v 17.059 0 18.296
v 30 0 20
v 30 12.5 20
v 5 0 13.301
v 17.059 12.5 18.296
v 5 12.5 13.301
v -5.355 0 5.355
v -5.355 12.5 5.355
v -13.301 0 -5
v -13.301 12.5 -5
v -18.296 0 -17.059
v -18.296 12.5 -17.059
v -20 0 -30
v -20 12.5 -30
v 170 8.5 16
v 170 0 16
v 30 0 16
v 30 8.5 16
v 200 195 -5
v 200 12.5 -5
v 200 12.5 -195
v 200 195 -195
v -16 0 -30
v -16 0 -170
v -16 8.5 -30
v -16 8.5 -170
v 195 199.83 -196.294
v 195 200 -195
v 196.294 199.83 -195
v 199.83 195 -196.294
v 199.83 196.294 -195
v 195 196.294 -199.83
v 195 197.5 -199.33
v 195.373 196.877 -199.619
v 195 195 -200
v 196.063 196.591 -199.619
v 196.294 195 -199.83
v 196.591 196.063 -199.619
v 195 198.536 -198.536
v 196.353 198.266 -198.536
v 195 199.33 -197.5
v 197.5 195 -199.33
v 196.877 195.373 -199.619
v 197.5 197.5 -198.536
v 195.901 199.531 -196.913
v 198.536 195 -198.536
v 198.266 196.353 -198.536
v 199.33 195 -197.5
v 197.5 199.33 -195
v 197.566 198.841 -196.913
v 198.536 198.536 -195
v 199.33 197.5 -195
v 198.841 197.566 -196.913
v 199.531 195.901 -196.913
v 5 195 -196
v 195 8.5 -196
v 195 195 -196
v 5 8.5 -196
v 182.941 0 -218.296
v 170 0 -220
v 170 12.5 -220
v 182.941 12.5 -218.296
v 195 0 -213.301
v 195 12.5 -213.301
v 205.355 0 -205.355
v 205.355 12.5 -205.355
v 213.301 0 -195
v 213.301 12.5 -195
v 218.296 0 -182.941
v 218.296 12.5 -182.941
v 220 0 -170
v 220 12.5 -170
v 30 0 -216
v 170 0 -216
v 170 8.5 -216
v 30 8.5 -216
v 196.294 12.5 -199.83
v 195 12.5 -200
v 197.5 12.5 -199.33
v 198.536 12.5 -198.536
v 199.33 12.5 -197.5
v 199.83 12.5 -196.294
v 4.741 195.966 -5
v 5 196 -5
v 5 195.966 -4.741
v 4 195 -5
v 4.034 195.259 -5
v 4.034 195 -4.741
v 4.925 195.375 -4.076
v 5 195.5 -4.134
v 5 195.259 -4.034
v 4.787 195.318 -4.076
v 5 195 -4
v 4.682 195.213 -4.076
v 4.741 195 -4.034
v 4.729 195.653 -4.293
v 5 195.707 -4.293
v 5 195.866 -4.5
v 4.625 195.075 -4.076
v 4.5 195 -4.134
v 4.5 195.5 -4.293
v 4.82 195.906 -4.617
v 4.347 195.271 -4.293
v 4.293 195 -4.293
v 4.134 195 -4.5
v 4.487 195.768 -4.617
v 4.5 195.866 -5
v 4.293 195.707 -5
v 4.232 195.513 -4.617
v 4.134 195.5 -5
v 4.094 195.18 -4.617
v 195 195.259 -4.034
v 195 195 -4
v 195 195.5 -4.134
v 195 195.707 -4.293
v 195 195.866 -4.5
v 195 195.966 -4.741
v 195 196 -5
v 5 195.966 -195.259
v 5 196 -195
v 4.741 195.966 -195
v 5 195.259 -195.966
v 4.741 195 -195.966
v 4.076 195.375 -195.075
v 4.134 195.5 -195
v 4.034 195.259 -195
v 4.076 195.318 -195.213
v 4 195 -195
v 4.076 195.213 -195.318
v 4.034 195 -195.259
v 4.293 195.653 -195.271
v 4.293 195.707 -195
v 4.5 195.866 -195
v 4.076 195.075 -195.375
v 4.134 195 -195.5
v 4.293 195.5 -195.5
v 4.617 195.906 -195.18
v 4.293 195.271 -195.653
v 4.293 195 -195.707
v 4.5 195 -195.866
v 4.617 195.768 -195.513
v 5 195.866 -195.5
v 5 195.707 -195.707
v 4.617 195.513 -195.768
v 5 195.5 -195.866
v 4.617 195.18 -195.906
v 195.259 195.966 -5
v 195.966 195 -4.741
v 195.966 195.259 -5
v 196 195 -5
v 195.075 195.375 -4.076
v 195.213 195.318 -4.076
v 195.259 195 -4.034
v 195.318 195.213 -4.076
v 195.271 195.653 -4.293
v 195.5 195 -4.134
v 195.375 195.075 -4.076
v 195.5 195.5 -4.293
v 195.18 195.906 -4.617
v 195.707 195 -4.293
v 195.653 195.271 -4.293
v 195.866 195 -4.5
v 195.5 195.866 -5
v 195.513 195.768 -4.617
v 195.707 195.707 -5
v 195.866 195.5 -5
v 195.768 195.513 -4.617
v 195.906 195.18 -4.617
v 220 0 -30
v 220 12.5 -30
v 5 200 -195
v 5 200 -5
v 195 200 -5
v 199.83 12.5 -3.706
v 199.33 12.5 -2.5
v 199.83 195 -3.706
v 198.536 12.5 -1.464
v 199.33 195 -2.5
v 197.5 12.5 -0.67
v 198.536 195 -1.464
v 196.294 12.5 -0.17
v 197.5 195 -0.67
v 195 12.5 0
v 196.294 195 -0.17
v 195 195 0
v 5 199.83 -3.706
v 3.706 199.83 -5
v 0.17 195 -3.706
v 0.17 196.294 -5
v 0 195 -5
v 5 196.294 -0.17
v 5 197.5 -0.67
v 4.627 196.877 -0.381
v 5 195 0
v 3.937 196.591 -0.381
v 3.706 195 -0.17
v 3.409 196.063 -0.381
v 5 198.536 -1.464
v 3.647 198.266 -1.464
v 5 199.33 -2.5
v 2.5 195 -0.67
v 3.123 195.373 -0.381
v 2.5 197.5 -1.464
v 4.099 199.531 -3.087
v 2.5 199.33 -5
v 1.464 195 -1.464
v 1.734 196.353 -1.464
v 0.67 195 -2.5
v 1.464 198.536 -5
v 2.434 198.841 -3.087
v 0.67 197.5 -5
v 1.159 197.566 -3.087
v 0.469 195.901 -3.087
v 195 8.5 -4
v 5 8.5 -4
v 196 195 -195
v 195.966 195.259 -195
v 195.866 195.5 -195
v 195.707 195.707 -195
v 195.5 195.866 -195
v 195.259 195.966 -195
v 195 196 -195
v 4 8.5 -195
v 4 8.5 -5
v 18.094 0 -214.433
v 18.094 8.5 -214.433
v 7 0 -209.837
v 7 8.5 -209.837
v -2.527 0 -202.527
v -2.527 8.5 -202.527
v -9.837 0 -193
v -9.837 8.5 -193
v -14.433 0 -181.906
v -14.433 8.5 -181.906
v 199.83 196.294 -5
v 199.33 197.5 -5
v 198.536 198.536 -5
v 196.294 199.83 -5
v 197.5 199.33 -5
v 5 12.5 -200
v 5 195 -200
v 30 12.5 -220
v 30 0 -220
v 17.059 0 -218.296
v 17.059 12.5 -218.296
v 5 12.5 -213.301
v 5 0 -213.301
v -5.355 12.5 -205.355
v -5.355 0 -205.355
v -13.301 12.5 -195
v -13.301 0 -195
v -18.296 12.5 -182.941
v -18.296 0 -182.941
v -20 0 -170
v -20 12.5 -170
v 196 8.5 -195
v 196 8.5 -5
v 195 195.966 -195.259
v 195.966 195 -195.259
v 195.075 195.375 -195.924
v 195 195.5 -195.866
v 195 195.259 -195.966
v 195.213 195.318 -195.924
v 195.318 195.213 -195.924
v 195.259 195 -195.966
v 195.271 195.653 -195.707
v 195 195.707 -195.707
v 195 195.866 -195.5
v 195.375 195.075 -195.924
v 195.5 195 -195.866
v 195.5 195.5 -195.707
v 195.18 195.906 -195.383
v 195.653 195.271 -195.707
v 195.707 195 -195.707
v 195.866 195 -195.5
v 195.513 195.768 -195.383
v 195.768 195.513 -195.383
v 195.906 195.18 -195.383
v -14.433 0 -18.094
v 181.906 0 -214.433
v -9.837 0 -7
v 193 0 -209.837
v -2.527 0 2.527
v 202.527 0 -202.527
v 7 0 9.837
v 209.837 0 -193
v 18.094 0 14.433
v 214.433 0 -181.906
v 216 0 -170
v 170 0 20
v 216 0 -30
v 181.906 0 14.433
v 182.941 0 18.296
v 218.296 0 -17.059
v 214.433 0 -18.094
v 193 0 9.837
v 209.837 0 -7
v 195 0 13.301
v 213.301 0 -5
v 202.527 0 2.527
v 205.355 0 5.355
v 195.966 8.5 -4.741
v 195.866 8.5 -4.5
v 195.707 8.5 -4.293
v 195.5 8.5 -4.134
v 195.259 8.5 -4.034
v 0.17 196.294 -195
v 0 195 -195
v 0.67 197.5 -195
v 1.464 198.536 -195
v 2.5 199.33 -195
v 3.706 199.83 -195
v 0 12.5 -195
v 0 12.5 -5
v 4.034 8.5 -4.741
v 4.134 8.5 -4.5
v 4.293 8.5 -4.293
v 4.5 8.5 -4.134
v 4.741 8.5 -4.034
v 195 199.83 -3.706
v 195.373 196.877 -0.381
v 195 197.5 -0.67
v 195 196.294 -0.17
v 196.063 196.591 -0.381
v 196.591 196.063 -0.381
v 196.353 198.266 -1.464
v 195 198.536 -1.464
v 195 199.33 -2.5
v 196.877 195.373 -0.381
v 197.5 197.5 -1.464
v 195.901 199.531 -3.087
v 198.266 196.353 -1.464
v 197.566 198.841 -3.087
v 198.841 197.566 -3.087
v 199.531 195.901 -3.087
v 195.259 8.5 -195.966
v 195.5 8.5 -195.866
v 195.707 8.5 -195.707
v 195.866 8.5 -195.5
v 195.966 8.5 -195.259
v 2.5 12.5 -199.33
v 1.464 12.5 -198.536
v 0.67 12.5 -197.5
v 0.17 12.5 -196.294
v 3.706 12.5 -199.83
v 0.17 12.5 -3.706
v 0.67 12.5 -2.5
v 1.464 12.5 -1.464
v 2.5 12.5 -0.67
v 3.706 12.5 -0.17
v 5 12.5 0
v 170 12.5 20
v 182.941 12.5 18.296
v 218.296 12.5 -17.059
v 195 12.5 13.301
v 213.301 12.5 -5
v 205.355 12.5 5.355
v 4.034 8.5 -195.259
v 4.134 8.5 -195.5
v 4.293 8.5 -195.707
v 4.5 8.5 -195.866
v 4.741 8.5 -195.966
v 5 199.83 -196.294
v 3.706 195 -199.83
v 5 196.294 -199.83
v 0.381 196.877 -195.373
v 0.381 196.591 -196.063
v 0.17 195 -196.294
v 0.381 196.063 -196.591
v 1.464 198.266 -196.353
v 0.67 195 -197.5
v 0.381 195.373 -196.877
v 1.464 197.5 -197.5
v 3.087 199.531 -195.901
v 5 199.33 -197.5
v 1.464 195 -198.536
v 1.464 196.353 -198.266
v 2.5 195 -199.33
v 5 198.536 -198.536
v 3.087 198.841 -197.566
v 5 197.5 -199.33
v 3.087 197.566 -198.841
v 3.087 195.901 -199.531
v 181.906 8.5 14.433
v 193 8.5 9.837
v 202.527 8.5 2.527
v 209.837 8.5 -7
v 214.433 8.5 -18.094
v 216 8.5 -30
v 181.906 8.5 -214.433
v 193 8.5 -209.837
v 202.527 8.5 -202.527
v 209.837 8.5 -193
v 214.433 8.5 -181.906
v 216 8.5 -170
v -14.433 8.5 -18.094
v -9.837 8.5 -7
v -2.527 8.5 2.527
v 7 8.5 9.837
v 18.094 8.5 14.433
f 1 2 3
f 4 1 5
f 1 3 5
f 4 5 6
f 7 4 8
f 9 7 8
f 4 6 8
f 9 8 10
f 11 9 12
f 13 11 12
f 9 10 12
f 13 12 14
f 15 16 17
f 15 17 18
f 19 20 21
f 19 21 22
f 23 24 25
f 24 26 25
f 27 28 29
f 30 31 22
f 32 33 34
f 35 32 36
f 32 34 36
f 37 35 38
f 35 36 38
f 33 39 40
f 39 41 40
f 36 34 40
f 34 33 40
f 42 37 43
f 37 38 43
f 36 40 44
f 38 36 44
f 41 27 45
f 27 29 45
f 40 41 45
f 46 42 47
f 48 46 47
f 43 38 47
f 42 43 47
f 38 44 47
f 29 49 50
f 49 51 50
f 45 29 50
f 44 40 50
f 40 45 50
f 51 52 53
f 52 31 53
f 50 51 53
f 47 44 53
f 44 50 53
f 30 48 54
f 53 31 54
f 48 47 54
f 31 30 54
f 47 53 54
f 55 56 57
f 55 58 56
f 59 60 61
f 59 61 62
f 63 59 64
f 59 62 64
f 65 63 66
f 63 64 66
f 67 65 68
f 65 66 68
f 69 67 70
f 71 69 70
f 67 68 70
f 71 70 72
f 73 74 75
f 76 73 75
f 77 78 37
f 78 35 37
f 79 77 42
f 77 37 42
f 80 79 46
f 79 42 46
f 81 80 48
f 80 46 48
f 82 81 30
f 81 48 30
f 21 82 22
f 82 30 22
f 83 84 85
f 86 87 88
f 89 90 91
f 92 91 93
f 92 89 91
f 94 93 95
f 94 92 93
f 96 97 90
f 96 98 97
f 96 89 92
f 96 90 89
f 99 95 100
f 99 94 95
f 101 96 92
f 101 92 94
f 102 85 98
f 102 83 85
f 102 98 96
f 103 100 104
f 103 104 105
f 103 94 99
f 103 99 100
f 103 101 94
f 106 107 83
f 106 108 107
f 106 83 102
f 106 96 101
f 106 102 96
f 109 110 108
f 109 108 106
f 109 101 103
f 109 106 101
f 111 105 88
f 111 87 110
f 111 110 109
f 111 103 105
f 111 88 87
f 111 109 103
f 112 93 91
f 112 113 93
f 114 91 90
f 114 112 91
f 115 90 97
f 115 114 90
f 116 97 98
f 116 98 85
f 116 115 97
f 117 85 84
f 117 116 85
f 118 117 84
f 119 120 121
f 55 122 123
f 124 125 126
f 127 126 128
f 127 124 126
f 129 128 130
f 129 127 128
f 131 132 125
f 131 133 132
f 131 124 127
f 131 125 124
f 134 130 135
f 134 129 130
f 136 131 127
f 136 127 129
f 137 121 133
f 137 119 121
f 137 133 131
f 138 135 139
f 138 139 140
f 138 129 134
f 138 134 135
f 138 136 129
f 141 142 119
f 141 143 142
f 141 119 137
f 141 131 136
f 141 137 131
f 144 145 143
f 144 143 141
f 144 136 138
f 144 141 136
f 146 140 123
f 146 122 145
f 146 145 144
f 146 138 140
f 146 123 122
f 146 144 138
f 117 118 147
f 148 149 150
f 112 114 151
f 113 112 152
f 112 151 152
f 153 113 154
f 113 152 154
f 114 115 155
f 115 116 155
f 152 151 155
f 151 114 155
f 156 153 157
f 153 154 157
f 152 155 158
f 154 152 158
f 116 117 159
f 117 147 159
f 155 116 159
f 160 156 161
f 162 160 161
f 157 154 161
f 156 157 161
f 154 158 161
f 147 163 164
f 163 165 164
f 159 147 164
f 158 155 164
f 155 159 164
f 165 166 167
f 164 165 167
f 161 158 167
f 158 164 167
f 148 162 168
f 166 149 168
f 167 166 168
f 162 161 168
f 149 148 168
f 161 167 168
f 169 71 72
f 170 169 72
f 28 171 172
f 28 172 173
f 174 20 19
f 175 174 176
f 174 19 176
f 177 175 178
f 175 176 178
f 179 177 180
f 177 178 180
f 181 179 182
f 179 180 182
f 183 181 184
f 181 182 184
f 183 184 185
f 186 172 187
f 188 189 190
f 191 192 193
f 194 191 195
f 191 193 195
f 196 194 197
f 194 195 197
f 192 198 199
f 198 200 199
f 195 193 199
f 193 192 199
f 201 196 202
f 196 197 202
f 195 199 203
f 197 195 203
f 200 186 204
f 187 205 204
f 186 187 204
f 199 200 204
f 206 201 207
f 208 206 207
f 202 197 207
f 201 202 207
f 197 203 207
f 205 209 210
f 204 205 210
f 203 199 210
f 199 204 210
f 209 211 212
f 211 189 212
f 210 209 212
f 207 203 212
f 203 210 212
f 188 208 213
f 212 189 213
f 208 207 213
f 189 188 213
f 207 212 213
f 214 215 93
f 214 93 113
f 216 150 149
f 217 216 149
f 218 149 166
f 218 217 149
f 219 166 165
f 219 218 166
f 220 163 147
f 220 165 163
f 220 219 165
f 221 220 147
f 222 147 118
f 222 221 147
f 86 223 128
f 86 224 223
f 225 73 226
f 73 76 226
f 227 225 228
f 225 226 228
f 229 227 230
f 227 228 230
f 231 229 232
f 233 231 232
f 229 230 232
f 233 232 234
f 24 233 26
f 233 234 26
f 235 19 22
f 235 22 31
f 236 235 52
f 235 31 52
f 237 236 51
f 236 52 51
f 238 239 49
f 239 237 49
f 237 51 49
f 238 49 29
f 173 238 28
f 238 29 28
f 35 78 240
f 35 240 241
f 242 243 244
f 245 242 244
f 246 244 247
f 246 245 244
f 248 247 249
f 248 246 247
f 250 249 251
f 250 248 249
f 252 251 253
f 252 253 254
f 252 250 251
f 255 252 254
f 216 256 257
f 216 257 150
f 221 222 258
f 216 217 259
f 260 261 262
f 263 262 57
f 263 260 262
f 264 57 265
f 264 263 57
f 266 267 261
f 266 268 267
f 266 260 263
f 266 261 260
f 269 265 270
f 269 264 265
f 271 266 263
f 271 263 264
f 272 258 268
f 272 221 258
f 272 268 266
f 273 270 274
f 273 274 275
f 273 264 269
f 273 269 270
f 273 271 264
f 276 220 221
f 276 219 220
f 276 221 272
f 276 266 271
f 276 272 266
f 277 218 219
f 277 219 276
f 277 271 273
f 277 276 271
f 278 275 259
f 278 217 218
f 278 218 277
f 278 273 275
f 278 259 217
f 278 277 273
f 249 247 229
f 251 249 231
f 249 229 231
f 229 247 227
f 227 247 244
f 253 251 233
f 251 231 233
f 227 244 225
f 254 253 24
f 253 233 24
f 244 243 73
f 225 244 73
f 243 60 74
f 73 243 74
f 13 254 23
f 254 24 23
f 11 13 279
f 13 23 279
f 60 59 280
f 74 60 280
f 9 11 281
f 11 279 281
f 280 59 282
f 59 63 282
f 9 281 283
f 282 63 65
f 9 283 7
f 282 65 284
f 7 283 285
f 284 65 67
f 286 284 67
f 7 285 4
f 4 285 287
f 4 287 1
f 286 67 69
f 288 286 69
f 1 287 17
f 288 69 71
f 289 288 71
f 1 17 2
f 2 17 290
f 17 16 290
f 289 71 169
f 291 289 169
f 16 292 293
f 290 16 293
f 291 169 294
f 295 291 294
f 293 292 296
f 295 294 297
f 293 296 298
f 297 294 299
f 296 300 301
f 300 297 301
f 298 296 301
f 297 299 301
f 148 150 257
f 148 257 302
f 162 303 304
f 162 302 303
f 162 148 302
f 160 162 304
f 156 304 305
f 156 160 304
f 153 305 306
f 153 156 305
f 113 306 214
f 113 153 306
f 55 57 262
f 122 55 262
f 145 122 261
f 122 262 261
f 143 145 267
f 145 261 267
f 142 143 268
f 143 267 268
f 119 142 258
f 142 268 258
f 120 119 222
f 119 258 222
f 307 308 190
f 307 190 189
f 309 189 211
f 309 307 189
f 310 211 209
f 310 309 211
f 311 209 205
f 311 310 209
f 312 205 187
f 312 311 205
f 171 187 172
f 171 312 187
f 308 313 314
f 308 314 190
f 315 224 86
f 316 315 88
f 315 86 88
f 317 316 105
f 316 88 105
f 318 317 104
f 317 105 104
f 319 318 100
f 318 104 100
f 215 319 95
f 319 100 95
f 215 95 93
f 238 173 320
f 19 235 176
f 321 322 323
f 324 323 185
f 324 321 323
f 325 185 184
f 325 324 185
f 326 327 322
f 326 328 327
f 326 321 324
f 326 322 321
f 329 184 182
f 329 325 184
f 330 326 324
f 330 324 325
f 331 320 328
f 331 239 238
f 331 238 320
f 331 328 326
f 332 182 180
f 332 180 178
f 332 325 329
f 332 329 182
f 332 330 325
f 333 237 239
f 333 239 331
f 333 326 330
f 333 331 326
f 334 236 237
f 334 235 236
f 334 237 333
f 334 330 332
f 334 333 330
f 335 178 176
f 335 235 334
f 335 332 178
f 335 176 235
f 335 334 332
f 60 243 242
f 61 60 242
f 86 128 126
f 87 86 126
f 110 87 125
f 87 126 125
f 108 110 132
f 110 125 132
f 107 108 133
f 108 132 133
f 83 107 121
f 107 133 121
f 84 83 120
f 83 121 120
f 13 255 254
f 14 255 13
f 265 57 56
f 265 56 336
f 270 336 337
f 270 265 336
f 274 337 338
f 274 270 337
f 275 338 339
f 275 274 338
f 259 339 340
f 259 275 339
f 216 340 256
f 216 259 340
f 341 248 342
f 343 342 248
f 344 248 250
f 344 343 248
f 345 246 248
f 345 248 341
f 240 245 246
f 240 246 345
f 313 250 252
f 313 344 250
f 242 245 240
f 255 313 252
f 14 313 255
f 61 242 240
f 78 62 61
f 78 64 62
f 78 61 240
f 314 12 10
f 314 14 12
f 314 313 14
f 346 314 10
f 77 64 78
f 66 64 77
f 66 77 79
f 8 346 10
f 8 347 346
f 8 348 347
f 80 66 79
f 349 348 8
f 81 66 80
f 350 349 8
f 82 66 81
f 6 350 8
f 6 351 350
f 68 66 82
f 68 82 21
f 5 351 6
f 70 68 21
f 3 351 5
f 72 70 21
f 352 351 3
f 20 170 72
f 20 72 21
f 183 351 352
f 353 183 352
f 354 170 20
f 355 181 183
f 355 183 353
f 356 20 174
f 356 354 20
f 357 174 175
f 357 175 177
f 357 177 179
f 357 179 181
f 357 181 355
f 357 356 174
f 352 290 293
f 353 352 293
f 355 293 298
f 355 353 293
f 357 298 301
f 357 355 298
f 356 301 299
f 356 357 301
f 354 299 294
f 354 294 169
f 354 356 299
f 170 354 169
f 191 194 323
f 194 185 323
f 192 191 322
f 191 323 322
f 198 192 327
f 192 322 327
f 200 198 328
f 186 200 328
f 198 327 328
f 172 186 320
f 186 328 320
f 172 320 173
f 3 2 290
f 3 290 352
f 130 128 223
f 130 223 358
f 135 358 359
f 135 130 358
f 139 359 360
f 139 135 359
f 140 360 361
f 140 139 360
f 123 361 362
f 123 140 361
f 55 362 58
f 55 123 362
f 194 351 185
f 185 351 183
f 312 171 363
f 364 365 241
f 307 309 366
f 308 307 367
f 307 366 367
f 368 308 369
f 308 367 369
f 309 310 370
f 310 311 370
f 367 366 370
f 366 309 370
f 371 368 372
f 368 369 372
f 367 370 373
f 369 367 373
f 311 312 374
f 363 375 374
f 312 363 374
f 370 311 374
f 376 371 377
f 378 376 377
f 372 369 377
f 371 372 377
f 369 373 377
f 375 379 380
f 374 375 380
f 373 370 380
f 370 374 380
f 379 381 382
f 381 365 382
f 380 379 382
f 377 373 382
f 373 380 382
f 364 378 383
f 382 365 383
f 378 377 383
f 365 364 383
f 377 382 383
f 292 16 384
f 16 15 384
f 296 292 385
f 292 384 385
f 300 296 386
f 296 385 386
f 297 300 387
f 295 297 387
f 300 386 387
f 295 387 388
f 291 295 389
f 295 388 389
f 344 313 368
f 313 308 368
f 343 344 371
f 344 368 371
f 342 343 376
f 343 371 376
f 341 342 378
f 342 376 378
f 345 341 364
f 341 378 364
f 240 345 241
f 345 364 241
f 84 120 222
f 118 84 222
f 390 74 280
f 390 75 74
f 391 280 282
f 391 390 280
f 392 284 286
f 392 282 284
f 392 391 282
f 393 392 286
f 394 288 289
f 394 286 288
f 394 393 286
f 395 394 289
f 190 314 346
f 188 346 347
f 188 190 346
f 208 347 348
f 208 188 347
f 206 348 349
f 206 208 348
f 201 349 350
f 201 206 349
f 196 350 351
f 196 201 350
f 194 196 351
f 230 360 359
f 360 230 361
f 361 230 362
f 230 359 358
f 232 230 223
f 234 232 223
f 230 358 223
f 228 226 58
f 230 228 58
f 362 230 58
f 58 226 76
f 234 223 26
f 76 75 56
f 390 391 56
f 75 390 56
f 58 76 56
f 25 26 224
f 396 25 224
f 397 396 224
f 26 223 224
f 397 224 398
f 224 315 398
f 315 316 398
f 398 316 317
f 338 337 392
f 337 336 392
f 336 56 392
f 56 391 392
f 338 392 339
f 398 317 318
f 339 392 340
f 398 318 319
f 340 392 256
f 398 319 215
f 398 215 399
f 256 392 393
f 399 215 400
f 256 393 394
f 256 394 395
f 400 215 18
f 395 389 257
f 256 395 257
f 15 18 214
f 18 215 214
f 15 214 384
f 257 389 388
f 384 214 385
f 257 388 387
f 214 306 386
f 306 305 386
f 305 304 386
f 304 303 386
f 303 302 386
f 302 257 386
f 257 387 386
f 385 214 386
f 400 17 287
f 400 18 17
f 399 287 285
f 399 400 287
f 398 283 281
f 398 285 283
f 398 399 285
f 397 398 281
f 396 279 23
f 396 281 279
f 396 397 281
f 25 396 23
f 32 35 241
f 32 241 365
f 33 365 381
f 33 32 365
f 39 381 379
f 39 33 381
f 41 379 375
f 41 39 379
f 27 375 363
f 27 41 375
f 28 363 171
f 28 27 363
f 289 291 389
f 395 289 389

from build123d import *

# Parameters (mm, degrees)
SKETCH1_W           = 200
SKETCH1_H           = 200
BOSS_EXTRUDE1_DEPTH = 200
SKETCH3_W           = 200
SKETCH3_H           = 12.5
BOSS_EXTRUDE2_DEPTH = 20
SKETCH4_W           = 220
SKETCH4_H           = 12.5
BOSS_EXTRUDE3_DEPTH = 20
SKETCH5_W           = 220
SKETCH5_H           = 12.5
BOSS_EXTRUDE4_DEPTH = 20
SKETCH6_W           = 240
SKETCH6_H           = 12.5
BOSS_EXTRUDE5_DEPTH = 20
FILLET1_R           = 50
FILLET2_R           = 5
SHELL1_T            = -4


with BuildPart() as part:
    # Sketch1 → Boss-Extrude1 (new body)
    with BuildSketch(Plane(origin=(0, 0, 0), x_dir=(1, 0, 0), z_dir=(0, 1, 0))):
        with Locations((100, 100)):
            Rectangle(SKETCH1_W, SKETCH1_H)
    extrude(amount=BOSS_EXTRUDE1_DEPTH)

    # Sketch3 → Boss-Extrude2 (add)
    with BuildSketch(Plane.XY):
        with Locations((100, 6.25)):
            Rectangle(SKETCH3_W, SKETCH3_H)
    extrude(amount=BOSS_EXTRUDE2_DEPTH)

    # Sketch4 → Boss-Extrude3 (add)
    with BuildSketch(Plane(origin=(200, 0, 0), x_dir=(0, 0, -1), z_dir=(1, 0, 0))):
        with Locations((90, 6.25)):
            Rectangle(SKETCH4_W, SKETCH4_H)
    extrude(amount=BOSS_EXTRUDE3_DEPTH)

    # Sketch5 → Boss-Extrude4 (add)
    with BuildSketch(Plane(origin=(0, 0, -200), x_dir=(-1, 0, 0), z_dir=(0, 0, -1))):
        with Locations((-110, 6.25)):
            Rectangle(SKETCH5_W, SKETCH5_H)
    extrude(amount=BOSS_EXTRUDE4_DEPTH)

    # Sketch6 → Boss-Extrude5 (add)
    with BuildSketch(Plane.ZY):
        with Locations((-100, 6.25)):
            Rectangle(SKETCH6_W, SKETCH6_H)
    extrude(amount=BOSS_EXTRUDE5_DEPTH)

    # Fillet1
    fillet1_edges = [part.edges().sort_by_distance(p)[0] for p in [
        (220, 6.25, 20),
        (220, 6.25, -220),
        (-20, 6.25, -220),
        (-20, 6.25, 20),
    ]]
    fillet(fillet1_edges, radius=FILLET1_R)

    # Fillet2
    fillet2_edges = [part.edges().sort_by_distance(p)[0] for p in [
        (200, 200, -100),
        (100, 200, -200),
        (0, 200, -100),
        (100, 200, 0),
        (0, 106.25, -200),
        (200, 106.25, -200),
        (200, 106.25, 0),
        (0, 106.25, 0),
    ]]
    fillet(fillet2_edges, radius=FILLET2_R)

    # Shell1
    shell1_openings = [part.faces().sort_by_distance(p)[0] for p in [
        (100, 0, -100),
    ]]
    offset(amount=SHELL1_T, openings=shell1_openings, kind=Kind.INTERSECTION)


solid = part.part
